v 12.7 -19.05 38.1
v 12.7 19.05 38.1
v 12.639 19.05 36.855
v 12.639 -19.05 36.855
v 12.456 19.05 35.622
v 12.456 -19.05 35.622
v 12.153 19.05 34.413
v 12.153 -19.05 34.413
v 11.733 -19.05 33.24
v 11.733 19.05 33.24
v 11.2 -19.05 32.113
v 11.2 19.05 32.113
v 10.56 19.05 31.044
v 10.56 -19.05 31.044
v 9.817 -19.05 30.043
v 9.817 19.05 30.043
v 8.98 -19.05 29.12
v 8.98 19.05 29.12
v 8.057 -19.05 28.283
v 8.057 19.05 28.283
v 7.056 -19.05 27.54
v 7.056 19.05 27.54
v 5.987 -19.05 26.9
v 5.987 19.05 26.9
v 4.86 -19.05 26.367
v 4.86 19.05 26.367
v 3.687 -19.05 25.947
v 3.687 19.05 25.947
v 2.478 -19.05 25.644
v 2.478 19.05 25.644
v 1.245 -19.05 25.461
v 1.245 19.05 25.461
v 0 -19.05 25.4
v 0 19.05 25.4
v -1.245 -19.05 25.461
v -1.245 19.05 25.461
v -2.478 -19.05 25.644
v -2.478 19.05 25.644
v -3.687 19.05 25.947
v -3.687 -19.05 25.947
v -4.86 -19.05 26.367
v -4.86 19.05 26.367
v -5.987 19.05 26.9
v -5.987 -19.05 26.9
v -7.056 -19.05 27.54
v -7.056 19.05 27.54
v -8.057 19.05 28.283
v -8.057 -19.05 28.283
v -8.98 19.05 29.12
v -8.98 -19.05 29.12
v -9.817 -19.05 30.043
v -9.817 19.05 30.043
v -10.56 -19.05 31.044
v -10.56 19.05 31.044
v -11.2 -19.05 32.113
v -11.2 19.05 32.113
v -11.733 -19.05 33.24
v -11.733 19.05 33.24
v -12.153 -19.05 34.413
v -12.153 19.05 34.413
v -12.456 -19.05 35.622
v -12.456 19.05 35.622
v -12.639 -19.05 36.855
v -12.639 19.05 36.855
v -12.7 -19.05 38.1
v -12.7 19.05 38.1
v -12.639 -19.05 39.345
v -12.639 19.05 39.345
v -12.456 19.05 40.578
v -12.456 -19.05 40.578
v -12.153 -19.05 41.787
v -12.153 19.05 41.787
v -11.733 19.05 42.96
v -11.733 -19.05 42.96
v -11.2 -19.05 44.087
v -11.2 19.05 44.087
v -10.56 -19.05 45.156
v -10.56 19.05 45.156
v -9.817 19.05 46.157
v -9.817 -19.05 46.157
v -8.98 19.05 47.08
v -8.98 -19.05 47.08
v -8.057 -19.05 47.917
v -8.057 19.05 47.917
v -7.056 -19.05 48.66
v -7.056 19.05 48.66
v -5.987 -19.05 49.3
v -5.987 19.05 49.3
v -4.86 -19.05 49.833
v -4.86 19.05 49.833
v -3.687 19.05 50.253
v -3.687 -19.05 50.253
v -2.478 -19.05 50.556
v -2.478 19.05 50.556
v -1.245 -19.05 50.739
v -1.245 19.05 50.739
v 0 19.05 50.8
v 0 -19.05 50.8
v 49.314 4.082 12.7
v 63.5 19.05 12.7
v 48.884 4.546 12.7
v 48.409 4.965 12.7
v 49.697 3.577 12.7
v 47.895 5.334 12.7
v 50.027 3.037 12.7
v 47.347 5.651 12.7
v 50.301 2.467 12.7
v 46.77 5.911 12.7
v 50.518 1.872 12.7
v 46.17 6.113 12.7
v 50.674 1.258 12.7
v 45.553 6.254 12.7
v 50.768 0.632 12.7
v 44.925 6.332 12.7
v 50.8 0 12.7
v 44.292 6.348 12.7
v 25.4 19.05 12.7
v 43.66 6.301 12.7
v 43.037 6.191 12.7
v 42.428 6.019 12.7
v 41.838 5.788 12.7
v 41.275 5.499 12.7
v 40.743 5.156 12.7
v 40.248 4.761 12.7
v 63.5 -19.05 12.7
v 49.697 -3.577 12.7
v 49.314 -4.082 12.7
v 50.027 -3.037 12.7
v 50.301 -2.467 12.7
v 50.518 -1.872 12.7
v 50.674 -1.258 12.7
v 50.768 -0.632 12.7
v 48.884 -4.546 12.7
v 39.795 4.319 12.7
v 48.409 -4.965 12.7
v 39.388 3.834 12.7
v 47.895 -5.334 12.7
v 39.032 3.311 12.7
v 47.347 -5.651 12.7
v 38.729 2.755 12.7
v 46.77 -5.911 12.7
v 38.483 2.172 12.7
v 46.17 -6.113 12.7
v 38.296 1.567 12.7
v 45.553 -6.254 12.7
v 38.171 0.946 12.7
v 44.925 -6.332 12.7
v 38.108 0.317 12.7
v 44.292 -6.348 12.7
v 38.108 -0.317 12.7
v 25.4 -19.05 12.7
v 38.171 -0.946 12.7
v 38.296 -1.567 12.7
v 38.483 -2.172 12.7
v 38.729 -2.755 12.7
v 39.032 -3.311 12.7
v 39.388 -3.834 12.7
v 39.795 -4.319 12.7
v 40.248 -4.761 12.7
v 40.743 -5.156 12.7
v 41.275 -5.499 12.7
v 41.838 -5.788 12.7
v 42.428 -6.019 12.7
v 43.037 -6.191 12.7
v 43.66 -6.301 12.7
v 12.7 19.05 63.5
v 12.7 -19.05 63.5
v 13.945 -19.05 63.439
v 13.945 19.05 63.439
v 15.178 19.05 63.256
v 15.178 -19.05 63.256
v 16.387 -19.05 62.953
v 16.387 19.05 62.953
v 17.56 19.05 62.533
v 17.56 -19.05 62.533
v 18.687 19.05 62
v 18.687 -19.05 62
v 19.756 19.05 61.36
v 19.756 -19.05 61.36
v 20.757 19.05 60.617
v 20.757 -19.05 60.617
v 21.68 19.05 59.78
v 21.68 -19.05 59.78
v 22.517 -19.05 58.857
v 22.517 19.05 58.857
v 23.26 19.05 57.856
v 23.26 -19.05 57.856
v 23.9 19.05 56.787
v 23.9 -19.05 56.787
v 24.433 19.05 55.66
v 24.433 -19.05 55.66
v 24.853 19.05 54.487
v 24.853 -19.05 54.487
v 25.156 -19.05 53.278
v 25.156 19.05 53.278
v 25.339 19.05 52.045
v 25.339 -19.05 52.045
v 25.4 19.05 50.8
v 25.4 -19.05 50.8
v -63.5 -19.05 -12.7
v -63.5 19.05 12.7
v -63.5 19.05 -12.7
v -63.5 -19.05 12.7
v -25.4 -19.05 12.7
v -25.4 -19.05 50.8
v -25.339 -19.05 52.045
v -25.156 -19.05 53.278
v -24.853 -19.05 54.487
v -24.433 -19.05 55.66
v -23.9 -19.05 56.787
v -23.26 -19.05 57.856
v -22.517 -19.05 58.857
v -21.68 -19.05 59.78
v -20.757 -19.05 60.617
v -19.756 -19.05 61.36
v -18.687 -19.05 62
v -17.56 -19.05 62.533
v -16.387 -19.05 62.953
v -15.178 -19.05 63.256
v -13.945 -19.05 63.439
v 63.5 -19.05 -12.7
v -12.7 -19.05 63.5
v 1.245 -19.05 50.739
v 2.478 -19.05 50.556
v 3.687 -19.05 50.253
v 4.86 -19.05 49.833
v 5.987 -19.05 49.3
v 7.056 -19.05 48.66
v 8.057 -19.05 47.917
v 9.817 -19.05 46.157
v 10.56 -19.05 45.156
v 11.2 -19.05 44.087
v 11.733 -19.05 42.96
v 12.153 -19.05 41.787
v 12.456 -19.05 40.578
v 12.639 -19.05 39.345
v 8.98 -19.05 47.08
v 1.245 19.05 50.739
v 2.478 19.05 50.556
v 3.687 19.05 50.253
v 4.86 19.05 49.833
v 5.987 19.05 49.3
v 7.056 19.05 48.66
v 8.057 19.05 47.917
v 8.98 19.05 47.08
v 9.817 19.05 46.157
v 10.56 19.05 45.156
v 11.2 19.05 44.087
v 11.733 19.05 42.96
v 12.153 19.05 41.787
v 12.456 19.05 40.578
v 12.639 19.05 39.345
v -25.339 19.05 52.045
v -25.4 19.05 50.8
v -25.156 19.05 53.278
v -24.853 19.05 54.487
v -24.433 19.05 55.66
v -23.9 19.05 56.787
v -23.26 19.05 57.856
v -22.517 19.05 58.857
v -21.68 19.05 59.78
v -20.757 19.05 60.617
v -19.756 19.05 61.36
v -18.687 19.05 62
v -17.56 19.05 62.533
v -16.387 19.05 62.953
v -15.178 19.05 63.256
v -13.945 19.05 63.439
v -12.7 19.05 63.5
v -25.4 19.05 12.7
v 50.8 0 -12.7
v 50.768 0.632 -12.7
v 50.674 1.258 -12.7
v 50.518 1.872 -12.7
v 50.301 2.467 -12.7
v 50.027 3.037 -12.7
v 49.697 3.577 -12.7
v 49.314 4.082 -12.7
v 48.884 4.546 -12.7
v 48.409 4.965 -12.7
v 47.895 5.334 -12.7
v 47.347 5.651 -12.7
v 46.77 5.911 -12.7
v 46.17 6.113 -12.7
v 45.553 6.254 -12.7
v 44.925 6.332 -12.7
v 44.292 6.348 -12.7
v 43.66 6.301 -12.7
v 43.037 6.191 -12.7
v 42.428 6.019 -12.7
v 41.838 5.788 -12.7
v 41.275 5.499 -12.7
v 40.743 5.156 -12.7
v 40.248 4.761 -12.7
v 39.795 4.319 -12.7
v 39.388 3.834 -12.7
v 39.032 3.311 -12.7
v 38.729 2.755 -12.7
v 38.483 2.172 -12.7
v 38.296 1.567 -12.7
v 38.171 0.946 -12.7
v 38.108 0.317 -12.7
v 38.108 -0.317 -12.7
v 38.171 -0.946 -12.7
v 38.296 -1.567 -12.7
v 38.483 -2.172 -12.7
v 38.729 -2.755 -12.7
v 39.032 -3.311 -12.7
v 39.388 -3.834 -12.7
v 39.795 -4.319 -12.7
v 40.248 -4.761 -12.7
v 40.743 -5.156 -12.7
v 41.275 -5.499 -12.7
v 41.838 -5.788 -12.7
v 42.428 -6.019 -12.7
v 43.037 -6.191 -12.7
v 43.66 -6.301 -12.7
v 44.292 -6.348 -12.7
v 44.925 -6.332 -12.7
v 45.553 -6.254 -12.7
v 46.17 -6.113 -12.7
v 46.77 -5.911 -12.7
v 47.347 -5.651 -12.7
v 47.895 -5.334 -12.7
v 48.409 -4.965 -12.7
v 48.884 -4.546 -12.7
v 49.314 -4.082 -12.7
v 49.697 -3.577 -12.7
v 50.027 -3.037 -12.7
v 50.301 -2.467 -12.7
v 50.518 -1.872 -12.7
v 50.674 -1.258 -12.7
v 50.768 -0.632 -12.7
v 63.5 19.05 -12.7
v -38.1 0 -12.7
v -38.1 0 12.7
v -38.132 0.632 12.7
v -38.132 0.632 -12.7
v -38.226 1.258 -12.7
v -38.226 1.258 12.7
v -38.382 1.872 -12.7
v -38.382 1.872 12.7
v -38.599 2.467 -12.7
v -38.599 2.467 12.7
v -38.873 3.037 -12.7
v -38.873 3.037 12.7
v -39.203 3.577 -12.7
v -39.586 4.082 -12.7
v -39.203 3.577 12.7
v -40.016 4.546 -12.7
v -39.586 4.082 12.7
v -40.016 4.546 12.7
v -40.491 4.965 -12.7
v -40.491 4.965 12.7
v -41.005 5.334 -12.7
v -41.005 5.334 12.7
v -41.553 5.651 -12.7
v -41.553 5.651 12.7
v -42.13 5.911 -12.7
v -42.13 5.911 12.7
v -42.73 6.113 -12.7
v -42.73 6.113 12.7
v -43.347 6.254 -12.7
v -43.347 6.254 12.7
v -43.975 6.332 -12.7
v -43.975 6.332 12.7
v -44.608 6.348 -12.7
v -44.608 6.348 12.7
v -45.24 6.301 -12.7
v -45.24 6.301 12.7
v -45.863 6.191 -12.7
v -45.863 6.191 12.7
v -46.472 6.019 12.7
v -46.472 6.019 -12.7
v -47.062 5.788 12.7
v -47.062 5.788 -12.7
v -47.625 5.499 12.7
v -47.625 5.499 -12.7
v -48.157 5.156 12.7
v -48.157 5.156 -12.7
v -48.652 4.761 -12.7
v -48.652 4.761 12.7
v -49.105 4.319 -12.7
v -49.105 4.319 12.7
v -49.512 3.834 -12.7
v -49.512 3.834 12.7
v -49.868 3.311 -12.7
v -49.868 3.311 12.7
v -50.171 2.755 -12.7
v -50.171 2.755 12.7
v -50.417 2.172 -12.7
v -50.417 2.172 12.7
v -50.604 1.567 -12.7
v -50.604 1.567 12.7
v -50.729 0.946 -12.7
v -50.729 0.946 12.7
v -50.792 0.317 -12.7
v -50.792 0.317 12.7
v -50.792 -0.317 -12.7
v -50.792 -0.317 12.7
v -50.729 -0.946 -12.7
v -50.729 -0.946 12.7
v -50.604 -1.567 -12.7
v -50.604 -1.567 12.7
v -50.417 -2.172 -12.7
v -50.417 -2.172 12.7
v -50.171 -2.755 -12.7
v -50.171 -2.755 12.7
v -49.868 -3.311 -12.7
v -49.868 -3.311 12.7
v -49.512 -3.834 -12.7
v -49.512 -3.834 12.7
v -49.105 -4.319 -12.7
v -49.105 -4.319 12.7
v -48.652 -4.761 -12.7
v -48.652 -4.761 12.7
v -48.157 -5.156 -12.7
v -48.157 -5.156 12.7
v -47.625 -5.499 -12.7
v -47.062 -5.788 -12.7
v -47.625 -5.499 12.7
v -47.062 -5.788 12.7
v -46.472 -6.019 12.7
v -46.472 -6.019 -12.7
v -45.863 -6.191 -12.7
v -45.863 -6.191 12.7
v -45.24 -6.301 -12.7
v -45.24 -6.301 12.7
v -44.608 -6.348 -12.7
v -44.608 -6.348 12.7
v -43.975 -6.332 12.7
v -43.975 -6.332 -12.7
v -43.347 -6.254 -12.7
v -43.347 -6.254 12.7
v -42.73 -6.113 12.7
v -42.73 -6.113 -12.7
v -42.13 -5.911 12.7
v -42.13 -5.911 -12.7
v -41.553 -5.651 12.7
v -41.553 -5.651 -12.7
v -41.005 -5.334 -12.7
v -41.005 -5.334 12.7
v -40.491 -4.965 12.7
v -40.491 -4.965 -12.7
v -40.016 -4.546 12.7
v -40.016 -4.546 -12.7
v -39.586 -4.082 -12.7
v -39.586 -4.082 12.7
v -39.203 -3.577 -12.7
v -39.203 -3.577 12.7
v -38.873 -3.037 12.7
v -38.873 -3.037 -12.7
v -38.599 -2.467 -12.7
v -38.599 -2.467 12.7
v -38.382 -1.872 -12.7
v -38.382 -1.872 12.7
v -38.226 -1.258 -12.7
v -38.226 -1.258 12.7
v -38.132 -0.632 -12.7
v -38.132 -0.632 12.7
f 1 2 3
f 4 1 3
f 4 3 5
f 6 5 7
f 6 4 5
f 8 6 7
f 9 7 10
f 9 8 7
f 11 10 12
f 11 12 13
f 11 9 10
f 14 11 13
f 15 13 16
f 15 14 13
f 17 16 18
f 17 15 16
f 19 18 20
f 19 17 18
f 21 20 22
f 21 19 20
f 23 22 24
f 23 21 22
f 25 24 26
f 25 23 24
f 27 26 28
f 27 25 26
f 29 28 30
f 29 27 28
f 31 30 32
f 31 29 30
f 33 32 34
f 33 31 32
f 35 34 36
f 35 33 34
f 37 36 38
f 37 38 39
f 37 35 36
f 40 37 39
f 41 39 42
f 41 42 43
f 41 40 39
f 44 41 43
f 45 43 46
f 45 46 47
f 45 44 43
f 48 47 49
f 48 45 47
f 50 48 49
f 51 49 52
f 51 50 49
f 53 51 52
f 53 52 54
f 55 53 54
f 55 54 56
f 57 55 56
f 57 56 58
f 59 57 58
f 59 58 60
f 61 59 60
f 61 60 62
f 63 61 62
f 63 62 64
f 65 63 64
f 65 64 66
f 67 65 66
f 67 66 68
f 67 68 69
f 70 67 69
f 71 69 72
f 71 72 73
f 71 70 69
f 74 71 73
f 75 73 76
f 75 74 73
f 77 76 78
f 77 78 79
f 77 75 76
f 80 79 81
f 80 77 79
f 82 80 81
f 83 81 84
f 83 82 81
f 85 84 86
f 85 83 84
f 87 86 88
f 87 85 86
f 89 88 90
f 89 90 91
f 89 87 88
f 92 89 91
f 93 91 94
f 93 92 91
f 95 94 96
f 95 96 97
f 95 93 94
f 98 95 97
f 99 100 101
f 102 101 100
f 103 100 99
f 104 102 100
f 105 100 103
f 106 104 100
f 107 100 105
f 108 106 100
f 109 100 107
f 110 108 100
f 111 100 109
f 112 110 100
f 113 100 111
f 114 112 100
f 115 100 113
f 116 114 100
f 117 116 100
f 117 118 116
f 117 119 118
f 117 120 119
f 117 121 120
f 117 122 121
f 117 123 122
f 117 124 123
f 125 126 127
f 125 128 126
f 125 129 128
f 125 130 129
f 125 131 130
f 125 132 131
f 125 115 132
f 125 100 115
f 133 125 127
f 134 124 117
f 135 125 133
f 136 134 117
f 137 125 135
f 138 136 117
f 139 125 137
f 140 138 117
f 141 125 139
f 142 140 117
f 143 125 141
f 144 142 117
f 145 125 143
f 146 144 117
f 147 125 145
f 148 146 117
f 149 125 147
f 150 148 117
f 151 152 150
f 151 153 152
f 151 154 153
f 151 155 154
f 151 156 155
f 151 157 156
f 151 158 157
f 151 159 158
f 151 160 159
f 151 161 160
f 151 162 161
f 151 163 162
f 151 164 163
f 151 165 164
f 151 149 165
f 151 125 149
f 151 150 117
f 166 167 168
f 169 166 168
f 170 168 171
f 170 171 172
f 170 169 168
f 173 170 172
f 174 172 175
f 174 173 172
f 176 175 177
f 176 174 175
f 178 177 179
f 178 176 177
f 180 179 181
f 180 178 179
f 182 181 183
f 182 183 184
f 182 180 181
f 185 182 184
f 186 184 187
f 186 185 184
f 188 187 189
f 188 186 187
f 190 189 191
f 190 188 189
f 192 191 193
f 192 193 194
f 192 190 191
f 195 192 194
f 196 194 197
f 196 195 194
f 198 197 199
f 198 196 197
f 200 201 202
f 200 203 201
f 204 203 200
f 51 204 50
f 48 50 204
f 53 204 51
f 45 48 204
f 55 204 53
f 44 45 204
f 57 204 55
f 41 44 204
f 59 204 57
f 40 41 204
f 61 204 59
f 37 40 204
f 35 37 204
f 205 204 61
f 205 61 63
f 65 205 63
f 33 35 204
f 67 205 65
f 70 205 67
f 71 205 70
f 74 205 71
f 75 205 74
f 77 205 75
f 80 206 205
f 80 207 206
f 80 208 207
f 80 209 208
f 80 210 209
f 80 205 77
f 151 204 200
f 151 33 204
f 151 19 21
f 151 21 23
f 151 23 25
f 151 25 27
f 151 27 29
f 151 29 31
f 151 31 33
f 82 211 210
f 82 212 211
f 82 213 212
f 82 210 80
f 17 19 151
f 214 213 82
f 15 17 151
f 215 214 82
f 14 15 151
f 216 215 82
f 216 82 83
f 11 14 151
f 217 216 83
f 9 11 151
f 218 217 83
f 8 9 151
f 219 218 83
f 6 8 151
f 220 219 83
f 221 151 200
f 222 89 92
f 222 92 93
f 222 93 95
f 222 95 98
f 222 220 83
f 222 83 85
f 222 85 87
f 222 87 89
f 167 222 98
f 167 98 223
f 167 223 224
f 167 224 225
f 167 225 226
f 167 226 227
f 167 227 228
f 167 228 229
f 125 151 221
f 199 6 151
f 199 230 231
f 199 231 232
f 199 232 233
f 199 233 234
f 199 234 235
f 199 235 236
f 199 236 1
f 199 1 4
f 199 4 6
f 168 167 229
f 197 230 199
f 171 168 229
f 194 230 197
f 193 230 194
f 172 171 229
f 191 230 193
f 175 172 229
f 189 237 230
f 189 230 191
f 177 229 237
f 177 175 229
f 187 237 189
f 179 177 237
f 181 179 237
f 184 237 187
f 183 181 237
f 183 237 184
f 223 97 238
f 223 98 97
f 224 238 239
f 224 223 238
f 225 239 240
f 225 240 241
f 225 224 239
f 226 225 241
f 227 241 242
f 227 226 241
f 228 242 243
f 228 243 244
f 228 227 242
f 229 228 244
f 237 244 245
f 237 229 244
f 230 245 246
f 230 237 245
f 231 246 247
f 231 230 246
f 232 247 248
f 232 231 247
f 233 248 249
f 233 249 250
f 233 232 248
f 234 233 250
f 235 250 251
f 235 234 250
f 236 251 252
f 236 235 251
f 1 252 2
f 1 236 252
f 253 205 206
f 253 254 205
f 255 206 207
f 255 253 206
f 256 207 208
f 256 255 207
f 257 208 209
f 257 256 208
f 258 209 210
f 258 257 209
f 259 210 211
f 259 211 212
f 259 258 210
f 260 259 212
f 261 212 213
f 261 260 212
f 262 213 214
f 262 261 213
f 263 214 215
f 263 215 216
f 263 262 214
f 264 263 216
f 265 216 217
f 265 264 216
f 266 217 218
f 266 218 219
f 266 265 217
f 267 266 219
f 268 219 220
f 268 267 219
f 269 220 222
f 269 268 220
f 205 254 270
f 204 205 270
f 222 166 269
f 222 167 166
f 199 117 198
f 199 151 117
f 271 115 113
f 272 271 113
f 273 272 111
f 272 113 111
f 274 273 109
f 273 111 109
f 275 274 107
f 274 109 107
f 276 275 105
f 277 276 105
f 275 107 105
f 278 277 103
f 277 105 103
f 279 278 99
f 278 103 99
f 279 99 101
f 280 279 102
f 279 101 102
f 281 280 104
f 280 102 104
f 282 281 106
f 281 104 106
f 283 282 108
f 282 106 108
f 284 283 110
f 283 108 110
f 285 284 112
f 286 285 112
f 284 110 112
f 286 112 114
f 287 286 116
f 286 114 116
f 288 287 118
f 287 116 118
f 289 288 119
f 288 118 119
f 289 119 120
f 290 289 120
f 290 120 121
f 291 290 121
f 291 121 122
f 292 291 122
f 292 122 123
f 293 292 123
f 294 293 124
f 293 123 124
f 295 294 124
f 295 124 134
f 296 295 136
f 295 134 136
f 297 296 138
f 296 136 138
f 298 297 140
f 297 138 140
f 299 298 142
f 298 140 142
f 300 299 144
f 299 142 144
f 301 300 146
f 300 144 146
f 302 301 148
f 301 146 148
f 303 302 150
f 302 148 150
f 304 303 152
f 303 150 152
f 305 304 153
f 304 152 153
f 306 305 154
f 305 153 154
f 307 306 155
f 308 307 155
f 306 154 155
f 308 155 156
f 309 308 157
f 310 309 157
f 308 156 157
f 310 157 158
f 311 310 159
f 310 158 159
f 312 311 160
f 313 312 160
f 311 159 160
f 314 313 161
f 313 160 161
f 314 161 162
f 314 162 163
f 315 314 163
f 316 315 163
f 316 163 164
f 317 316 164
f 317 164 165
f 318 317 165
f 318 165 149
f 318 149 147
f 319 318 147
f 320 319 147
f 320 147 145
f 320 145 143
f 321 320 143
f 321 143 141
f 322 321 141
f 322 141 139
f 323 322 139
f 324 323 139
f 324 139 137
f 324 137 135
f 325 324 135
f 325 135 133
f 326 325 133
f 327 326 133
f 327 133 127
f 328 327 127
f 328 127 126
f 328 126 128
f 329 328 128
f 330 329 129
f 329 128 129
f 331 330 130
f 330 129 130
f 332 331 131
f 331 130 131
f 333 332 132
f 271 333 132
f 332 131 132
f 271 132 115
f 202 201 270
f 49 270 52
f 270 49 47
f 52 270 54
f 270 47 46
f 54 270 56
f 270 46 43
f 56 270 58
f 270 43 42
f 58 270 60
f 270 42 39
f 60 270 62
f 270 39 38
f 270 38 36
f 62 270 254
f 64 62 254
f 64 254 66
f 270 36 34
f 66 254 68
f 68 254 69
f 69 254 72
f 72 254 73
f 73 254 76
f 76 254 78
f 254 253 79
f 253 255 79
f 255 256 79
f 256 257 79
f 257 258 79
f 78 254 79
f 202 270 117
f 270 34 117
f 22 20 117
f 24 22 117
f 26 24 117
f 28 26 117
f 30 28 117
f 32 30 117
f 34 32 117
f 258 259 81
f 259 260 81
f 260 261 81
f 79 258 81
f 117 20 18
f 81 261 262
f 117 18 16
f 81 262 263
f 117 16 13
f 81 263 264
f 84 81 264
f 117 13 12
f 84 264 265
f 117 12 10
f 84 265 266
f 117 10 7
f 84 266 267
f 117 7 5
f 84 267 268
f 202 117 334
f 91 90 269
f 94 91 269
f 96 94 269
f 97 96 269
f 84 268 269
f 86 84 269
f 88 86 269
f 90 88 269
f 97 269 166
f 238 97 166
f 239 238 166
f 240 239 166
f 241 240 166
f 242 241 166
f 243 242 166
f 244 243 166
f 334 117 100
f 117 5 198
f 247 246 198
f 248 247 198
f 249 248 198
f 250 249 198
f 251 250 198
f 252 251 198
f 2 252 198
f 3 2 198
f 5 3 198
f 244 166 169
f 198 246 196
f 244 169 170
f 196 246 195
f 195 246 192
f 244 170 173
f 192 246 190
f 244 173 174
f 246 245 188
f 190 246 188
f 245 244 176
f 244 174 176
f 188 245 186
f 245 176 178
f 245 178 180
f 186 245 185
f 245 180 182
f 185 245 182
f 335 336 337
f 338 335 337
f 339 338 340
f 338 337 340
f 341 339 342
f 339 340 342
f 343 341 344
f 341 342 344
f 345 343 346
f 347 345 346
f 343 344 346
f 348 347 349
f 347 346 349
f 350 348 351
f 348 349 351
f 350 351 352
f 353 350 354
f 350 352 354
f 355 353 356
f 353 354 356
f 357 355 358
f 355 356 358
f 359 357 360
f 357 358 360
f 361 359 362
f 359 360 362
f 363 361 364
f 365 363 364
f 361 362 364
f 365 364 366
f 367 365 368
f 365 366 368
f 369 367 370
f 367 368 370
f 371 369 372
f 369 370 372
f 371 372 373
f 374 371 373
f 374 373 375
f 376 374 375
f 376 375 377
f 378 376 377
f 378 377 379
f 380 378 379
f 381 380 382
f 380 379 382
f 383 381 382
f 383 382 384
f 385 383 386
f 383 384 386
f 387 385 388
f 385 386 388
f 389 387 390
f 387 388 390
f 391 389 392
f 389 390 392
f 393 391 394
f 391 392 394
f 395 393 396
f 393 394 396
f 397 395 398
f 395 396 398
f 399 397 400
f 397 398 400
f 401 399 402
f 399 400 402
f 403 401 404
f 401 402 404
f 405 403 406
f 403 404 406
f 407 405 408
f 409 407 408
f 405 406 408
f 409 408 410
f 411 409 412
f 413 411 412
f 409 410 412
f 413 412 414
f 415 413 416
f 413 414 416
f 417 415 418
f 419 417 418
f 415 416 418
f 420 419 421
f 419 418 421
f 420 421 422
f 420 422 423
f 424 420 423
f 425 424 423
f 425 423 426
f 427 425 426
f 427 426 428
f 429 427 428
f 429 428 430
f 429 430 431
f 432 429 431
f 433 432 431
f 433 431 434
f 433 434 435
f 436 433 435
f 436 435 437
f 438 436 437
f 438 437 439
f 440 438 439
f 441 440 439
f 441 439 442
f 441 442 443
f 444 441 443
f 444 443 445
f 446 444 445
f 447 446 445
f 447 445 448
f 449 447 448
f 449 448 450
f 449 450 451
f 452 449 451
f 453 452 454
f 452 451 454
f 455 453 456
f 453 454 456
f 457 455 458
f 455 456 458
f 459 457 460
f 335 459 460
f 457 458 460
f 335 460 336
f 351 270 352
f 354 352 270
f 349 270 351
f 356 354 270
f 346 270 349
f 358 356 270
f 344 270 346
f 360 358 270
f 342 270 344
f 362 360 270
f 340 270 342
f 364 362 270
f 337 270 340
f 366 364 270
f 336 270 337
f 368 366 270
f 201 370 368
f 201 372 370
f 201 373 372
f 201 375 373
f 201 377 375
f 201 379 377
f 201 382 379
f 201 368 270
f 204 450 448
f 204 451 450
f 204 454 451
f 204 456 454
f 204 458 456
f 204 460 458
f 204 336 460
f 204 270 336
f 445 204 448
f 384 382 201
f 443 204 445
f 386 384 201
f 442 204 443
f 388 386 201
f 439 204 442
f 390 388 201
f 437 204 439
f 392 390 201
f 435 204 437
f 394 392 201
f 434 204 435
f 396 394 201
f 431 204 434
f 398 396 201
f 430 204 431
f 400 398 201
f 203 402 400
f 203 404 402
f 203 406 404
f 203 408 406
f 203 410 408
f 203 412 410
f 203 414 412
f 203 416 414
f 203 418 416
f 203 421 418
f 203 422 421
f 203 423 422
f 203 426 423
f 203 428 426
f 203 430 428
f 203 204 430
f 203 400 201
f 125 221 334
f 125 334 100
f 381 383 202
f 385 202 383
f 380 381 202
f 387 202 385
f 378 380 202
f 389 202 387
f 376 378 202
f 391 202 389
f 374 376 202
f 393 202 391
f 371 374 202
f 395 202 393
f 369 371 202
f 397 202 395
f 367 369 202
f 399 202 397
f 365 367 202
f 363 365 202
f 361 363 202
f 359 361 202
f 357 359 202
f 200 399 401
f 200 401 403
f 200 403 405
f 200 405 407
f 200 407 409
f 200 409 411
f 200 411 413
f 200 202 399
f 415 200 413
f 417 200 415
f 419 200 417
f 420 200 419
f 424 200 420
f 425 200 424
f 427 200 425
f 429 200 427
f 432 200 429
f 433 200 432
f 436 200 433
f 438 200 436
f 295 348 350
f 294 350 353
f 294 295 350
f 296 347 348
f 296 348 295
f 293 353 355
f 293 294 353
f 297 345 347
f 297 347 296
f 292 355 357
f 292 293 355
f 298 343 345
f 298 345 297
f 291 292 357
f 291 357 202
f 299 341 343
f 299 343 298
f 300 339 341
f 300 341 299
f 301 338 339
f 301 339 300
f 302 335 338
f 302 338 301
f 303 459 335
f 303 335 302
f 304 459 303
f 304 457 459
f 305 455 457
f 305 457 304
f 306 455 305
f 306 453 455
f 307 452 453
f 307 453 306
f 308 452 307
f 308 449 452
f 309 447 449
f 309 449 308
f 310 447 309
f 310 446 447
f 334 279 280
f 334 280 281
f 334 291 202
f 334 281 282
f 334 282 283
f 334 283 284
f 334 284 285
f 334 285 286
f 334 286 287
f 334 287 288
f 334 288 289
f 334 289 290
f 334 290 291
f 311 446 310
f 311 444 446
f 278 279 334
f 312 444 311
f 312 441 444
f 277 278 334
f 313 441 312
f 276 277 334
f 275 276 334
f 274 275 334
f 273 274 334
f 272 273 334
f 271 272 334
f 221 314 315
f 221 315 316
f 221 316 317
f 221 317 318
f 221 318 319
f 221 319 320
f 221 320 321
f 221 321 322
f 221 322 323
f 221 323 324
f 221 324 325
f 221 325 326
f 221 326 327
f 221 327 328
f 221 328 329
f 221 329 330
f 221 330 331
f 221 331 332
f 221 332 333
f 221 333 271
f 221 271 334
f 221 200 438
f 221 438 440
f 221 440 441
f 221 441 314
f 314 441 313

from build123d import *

# Parameters (mm, degrees)
F1_DEPTH = 19.05
F2_R     = 12.7
F4_DEPTH = 25.4


with BuildPart() as f1:
    # F0 (on Front) → F1 (new body, symmetric)
    with BuildSketch(Plane.XZ):
        Polygon((-25.4, 12.7), (-63.5, 12.7), (-63.5, -12.7), (63.5, -12.7), (63.5, 12.7), (25.4, 12.7), (0, 12.7), align=None)
        Polygon((-25.4, 63.5), (-25.4, 12.7), (0, 12.7), (25.4, 12.7), (25.4, 63.5), (0, 63.5), align=None)
        with BuildLine():
            ThreePointArc((12.7, 38.1), (-8.980256, 29.119744), (0, 50.8))
            ThreePointArc((0, 50.8), (8.980256, 47.080256), (12.7, 38.1))
        make_face(mode=Mode.SUBTRACT)
    extrude(amount=F1_DEPTH, both=True)

    # F2
    f2_edges = [f1.edges().sort_by_distance(p)[0] for p in [
        (-25.4, 0, 63.5),
        (25.4, 0, 63.5),
    ]]
    fillet(f2_edges, radius=F2_R)

    # F3 (on face) → F4 (cut, symmetric)
    with BuildSketch(Plane.XY.offset(12.7)):
        with BuildLine():
            ThreePointArc((38.1, 0), (44.45, -6.35), (50.8, 0))
            ThreePointArc((50.8, 0), (44.45, 6.35), (38.1, 0))
        make_face()
        with BuildLine():
            ThreePointArc((-50.8, 0), (-44.45, -6.35), (-38.1, 0))
            ThreePointArc((-38.1, 0), (-44.45, 6.35), (-50.8, 0))
        make_face()
    extrude(amount=F4_DEPTH, both=True, mode=Mode.SUBTRACT)


solid = f1.part
